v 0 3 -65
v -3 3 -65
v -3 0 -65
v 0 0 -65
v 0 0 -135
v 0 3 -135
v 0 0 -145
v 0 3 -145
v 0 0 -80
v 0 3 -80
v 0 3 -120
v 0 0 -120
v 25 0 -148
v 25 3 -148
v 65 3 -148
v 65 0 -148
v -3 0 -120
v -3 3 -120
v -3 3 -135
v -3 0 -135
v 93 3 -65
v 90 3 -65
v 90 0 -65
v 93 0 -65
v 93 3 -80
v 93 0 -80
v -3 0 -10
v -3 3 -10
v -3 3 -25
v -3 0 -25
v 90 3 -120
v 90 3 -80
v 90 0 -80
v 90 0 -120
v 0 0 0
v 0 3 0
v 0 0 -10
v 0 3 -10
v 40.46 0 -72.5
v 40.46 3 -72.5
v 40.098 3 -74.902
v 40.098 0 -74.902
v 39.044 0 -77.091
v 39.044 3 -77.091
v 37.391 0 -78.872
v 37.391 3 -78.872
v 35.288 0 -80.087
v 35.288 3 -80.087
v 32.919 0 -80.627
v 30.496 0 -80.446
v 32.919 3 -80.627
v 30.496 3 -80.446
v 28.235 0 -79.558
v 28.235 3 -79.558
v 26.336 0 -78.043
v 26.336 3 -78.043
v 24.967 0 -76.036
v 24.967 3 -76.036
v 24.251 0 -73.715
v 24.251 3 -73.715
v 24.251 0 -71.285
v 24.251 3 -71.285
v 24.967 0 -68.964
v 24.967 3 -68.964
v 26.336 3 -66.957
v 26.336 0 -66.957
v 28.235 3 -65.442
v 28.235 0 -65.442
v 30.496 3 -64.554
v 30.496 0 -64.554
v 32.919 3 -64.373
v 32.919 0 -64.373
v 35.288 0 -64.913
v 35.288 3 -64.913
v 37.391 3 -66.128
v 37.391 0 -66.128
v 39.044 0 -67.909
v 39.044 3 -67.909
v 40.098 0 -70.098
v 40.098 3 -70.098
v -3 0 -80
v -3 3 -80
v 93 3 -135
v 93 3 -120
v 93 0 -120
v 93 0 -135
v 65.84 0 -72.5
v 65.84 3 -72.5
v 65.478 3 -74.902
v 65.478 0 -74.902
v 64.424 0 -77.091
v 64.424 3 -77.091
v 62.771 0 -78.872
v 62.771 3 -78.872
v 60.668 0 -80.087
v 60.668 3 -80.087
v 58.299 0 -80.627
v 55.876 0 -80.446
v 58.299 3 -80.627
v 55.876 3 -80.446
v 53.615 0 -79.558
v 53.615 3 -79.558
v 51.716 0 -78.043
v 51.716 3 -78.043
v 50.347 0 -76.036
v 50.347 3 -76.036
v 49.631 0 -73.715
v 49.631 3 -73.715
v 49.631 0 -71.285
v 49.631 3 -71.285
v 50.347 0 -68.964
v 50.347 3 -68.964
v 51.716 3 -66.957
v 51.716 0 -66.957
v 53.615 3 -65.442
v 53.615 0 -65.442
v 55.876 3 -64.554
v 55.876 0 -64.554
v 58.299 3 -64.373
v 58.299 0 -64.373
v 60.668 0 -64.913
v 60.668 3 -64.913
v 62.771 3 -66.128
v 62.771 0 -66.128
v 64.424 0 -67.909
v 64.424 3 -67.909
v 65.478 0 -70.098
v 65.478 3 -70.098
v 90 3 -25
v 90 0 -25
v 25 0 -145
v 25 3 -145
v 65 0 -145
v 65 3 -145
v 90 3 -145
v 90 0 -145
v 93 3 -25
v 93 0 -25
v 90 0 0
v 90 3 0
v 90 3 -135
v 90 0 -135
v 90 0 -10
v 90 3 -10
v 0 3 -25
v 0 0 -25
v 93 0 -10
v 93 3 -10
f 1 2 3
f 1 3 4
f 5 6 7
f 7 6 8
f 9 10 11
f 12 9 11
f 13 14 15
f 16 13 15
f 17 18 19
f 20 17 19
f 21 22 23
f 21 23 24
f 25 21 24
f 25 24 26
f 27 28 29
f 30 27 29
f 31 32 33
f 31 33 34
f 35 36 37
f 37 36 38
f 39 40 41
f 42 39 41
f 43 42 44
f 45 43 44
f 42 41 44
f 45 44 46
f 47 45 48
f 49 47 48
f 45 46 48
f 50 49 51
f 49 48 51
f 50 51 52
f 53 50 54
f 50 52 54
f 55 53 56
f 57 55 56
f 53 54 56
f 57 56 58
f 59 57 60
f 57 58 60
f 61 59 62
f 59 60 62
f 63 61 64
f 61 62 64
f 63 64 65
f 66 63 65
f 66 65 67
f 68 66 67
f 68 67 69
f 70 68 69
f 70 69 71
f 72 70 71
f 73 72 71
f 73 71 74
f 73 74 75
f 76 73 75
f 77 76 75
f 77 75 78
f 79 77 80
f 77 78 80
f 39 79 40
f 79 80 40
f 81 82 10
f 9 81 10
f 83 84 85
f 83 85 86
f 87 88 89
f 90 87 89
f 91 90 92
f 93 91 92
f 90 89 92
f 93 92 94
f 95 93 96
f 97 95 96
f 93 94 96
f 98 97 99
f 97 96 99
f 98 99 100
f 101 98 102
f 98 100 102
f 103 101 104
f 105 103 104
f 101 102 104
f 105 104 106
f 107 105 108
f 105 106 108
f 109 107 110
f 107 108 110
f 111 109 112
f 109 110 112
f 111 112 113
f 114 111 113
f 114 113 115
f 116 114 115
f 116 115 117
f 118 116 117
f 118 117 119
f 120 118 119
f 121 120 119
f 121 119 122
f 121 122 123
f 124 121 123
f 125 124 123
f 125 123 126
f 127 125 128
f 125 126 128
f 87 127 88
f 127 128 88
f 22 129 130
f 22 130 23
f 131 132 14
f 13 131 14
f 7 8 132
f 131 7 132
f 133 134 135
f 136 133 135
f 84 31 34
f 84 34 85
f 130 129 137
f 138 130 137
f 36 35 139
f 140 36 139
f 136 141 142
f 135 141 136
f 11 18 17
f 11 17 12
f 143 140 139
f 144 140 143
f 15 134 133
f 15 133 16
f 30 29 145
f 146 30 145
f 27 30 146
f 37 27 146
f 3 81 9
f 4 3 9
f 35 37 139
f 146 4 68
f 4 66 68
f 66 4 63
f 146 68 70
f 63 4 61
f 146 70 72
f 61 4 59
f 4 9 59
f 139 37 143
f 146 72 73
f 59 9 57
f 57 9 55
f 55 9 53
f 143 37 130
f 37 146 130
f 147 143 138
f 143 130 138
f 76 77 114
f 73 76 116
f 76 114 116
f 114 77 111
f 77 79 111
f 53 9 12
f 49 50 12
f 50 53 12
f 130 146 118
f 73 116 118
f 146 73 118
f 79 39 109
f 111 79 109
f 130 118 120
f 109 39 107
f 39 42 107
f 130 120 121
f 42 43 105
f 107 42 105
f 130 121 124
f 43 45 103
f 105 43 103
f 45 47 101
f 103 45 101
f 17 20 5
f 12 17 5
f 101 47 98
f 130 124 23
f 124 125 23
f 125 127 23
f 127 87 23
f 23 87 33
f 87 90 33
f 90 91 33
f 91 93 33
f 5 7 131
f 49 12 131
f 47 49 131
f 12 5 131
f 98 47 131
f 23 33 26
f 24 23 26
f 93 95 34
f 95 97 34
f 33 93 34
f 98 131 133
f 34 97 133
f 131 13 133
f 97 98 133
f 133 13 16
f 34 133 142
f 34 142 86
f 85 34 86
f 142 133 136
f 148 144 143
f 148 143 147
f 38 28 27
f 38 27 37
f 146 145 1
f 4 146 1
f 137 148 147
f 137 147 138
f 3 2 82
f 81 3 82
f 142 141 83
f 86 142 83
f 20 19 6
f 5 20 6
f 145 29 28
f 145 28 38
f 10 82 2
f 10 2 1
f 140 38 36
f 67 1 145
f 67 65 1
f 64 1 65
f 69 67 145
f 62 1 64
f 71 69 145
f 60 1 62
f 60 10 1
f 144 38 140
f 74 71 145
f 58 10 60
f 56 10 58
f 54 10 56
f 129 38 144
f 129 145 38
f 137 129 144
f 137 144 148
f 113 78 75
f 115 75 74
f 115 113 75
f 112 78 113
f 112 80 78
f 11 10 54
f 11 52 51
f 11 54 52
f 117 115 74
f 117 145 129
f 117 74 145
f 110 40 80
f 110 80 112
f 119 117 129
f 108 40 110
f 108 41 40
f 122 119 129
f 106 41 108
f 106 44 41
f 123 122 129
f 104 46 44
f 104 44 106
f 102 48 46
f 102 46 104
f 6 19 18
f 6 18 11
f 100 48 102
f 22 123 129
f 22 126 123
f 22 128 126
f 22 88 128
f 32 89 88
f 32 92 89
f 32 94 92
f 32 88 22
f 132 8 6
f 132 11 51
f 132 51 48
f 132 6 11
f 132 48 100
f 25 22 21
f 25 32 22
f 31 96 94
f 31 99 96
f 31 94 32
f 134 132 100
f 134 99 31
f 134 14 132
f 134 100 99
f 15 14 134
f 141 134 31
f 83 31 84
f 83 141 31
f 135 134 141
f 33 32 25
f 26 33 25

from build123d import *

# Parameters (mm, degrees)
SKETCH1_W           = 90
SKETCH1_H           = 132
BOSS_EXTRUDE1_DEPTH = 3
SKETCH7_W           = 90
SKETCH7_H           = 13
BOSS_EXTRUDE7_DEPTH = 3
SKETCH5_W           = 3
SKETCH5_H           = 15
BOSS_EXTRUDE5_DEPTH = 3
SKETCH6_W           = 40
SKETCH6_H           = 3
BOSS_EXTRUDE6_DEPTH = 3
SKETCH8_R           = 8.15
CUT_EXTRUDE1_DEPTH  = 3


with BuildPart() as part:
    # Sketch1 → Boss-Extrude1 (new body)
    with BuildSketch(Plane(origin=(0, 0, 0), x_dir=(1, 0, 0), z_dir=(0, 1, 0))):
        with Locations((45, 66)):
            Rectangle(SKETCH1_W, SKETCH1_H)
    extrude(amount=BOSS_EXTRUDE1_DEPTH)

    # Sketch7 → Boss-Extrude7 (add)
    with BuildSketch(Plane(origin=(0, 3, 0), x_dir=(1, 0, 0), z_dir=(0, 1, 0))):
        with Locations((45, 138.5)):
            Rectangle(SKETCH7_W, SKETCH7_H)
    extrude(amount=-BOSS_EXTRUDE7_DEPTH)

    # Sketch5 → Boss-Extrude5 (add)
    with BuildSketch(Plane(origin=(0, 3, 0), x_dir=(1, 0, 0), z_dir=(0, 1, 0))):
        with Locations((-1.5, 127.5)):
            Rectangle(SKETCH5_W, SKETCH5_H)
        with Locations((-1.5, 72.5)):
            Rectangle(SKETCH5_W, SKETCH5_H)
        with Locations((-1.5, 17.5)):
            Rectangle(SKETCH5_W, SKETCH5_H)
        with Locations((91.5, 127.5)):
            Rectangle(SKETCH5_W, SKETCH5_H)
        with Locations((91.5, 72.5)):
            Rectangle(SKETCH5_W, SKETCH5_H)
        with Locations((91.5, 17.5)):
            Rectangle(SKETCH5_W, SKETCH5_H)
    extrude(amount=-BOSS_EXTRUDE5_DEPTH)

    # Sketch6 → Boss-Extrude6 (add)
    with BuildSketch(Plane(origin=(0, 3, 0), x_dir=(1, 0, 0), z_dir=(0, 1, 0))):
        with Locations((45, 146.5)):
            Rectangle(SKETCH6_W, SKETCH6_H)
    extrude(amount=-BOSS_EXTRUDE6_DEPTH)

    # Sketch8 → Cut-Extrude1 (cut)
    with BuildSketch(Plane(origin=(0, 3, 0), x_dir=(1, 0, 0), z_dir=(0, 1, 0))):
        with Locations((32.31, 72.5)):
            Circle(SKETCH8_R)
        with Locations((57.69, 72.5)):
            Circle(SKETCH8_R)
    extrude(amount=-CUT_EXTRUDE1_DEPTH, mode=Mode.SUBTRACT)


solid = part.part
